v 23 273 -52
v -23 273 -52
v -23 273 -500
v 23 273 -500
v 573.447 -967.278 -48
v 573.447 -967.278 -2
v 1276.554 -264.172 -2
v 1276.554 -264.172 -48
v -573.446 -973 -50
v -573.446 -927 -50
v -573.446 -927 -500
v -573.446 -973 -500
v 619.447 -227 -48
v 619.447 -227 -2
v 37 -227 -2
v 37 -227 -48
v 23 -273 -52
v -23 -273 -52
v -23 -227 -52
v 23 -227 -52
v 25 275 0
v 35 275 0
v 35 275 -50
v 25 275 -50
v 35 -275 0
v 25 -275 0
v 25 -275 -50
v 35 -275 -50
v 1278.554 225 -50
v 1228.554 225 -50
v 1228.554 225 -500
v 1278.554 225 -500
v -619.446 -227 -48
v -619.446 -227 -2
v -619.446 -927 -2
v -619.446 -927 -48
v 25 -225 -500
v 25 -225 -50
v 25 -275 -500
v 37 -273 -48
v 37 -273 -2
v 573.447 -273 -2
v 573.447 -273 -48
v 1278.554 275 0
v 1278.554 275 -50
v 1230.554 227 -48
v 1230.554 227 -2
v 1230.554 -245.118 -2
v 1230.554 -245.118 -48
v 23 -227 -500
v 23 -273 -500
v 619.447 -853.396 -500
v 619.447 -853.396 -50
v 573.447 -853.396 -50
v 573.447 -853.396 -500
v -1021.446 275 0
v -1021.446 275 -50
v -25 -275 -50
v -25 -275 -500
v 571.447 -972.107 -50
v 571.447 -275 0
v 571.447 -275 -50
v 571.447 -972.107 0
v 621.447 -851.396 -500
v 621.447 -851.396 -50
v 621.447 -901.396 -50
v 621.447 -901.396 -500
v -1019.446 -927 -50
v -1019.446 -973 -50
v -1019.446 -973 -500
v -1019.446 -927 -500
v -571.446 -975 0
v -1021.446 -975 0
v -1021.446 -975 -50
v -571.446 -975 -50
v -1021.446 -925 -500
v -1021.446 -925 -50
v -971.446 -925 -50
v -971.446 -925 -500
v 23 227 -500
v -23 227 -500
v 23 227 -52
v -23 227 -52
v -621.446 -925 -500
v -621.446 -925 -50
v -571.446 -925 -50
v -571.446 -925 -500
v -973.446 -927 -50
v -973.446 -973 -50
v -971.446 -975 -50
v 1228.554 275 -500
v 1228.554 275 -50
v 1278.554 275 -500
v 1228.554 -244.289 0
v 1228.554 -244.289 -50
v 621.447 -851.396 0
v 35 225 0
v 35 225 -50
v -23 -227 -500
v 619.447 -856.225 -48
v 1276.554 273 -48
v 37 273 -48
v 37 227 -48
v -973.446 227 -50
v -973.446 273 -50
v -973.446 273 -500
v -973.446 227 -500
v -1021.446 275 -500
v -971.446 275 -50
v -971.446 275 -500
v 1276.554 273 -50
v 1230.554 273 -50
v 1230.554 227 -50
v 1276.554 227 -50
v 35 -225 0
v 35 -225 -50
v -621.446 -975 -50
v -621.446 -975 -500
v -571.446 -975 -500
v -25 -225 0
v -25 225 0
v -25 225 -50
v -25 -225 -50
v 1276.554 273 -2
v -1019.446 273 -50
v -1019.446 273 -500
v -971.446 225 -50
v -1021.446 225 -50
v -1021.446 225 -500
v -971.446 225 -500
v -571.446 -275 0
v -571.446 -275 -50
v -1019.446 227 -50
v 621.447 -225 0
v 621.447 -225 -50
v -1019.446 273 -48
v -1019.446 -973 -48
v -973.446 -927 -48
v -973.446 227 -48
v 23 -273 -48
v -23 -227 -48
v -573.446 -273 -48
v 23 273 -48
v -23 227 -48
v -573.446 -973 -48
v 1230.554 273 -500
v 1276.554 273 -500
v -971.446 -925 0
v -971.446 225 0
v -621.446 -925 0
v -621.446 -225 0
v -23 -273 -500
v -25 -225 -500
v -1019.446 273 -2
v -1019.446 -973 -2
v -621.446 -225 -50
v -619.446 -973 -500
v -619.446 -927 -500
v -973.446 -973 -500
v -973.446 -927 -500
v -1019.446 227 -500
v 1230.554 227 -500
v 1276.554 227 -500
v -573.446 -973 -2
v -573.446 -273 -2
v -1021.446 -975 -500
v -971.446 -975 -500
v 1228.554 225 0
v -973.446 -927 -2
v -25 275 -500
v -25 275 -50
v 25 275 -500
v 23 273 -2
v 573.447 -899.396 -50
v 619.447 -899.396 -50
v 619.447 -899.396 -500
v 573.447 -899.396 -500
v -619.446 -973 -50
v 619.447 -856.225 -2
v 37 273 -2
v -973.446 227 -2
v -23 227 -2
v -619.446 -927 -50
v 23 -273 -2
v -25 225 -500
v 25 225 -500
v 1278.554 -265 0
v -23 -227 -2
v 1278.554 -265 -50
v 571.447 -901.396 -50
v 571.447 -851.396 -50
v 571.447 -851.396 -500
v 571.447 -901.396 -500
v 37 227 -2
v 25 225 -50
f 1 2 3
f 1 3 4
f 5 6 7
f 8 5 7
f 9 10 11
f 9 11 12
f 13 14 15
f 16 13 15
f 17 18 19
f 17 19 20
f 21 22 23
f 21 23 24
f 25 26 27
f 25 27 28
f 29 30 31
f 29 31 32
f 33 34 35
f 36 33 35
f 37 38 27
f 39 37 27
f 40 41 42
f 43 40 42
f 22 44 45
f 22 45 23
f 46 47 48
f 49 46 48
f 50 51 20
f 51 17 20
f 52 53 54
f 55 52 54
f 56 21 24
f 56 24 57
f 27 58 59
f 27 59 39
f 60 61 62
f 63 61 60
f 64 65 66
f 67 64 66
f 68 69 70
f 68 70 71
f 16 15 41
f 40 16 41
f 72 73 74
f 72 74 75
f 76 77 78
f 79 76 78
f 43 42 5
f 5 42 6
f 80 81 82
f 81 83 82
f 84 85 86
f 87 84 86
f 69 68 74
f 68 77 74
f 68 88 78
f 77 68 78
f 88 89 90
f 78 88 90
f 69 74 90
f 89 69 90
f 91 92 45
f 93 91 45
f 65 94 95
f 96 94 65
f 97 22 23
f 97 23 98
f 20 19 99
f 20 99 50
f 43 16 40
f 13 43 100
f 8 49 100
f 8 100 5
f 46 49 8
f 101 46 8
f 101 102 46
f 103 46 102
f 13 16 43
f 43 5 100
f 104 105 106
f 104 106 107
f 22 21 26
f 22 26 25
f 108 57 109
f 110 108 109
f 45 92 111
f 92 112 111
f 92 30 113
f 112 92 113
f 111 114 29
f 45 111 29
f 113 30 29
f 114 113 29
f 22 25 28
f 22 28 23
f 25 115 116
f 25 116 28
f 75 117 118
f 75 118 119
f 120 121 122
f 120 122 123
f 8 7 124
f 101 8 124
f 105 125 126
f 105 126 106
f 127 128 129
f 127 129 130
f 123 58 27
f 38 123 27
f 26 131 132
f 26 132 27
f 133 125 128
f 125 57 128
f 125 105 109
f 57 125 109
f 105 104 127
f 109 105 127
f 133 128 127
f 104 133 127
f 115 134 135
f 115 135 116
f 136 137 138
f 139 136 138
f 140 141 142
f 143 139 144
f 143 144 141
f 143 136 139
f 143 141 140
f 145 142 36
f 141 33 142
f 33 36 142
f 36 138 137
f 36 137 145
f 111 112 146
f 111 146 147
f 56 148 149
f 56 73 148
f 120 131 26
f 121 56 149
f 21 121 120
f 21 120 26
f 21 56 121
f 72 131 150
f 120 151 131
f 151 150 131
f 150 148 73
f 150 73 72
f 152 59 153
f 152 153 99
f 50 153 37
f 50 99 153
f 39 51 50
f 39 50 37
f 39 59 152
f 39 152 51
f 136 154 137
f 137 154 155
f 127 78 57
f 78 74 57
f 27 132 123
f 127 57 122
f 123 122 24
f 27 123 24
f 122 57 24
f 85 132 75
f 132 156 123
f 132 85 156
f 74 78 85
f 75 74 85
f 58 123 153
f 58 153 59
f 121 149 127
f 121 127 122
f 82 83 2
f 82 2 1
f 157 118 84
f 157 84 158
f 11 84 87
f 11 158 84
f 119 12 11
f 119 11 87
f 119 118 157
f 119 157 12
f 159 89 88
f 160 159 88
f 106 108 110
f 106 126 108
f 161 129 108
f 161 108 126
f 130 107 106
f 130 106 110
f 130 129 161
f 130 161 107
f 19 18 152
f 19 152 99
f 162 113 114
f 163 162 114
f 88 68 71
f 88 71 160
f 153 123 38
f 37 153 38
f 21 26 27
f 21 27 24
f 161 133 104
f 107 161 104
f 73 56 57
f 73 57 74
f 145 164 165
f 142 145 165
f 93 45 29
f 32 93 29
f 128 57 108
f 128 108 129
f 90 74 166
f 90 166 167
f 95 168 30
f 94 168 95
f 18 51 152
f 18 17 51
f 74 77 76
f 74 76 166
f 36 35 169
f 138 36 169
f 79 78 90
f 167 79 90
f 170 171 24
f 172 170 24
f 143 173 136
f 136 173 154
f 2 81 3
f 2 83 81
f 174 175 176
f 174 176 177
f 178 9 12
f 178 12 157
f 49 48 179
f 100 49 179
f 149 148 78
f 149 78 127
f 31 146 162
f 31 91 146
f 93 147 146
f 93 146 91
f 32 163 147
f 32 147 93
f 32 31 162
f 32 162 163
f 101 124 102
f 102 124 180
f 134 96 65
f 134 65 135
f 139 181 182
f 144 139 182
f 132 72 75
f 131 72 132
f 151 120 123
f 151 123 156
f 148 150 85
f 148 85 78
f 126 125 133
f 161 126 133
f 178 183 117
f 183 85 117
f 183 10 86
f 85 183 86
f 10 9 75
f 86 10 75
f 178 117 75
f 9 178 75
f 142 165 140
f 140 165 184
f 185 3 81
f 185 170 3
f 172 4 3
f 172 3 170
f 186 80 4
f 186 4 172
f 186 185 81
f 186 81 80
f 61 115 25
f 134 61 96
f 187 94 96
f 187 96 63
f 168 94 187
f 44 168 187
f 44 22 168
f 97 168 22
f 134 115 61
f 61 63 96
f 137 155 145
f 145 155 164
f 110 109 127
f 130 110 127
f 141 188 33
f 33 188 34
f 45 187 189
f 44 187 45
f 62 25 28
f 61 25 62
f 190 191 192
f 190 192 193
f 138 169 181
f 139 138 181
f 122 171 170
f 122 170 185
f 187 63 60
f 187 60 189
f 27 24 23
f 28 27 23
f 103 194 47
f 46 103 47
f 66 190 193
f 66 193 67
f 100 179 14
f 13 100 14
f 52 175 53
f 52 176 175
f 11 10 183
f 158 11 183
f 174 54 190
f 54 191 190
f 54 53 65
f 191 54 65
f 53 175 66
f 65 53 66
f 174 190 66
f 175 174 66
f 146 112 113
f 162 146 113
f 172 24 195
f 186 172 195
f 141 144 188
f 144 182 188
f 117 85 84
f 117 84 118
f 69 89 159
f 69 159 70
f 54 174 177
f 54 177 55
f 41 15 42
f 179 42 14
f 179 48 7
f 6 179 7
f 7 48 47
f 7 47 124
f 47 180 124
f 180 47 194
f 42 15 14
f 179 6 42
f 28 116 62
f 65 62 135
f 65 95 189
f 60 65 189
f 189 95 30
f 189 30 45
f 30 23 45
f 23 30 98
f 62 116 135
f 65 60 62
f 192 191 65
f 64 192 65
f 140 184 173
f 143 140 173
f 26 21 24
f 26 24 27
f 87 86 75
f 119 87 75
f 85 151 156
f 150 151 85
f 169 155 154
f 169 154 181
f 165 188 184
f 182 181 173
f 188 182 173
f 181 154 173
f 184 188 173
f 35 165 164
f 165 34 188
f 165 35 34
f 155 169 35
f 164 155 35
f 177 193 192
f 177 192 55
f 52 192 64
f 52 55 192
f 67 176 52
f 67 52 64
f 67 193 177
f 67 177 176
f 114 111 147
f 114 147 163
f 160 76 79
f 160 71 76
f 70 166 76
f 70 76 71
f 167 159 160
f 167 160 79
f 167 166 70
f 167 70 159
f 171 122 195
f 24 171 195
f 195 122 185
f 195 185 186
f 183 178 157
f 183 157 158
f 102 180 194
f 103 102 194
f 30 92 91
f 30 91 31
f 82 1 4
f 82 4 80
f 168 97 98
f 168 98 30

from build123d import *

# Parameters (mm, degrees)
F1_DEPTH = 50
F2_DEPTH = 50
F3_DEPTH = 50
F4_T     = -2
F5_W     = 50
F5_H     = 50
F6_DEPTH = 450
F7_T     = -2


# Not quite as in the source:
# - a shell that OpenCascade refuses in one call is made with other operations: the cavity is built on its own and cut out


with BuildPart() as f1:
    # F0 (on Top) → F1 (new body)
    with BuildSketch(Plane.XY):
        Polygon((1278.5535, 275), (35, 275), (35, 225), (1228.5535, 225), align=None)
        Polygon((35, -225), (35, -275), (571.4467188135, -275), (621.4467188135, -225), align=None)
        Polygon((1278.5535, -265), (1278.5535, 275), (1228.5535, 225), (1228.5535, -244.2893218813), align=None)
        Polygon((621.4467188135, -851.3961030679), (571.4467188135, -901.3961030679), (571.4467188135, -972.1067811865), (1278.5535, -265), (1228.5535, -244.2893218813), align=None)
        Polygon((621.4467188135, -225), (571.4467188135, -275), (571.4467188135, -901.3961030679), (621.4467188135, -851.3961030679), align=None)
    extrude(amount=-F1_DEPTH)

    # F4#2 (hollow: no face is removed)
    offset(amount=F4_T, kind=Kind.INTERSECTION, mode=Mode.SUBTRACT)


with BuildPart() as f2:
    # F0 (on Top) → F2 (new body)
    with BuildSketch(Plane.XY):
        Polygon((-1021.4465, 275), (-1021.4465, -975), (-971.4465, -925), (-971.4465, 225), align=None)
        Polygon((-1021.4465, -975), (-571.4465, -975), (-621.4465, -925), (-971.4465, -925), align=None)
        Polygon((-621.4465, -925), (-571.4465, -975), (-571.4465, -275), (-621.4465, -225), align=None)
        Polygon((25, 275), (-1021.4465, 275), (-971.4465, 225), (-25, 225), align=None)
        Polygon((-621.4465, -225), (-571.4465, -275), (25, -275), (-25, -225), align=None)
        Polygon((-25, -225), (25, -275), (25, 275), (-25, 225), align=None)
    extrude(amount=-F2_DEPTH)

    # F4 (hollow: no face is removed)
    offset(amount=F4_T, kind=Kind.INTERSECTION, mode=Mode.SUBTRACT)


with BuildPart() as f3:
    # F0 (on Top) → F3 (new body)
    with BuildSketch(Plane.XY):
        Polygon((25, 275), (25, -275), (35, -275), (35, -225), (35, 225), (35, 275), align=None)
    extrude(amount=-F3_DEPTH)


with BuildPart() as f6:
    # F5 (on face) → F6 (new body)
    with BuildSketch(Plane(origin=(0, 0, -50), x_dir=(1, 0, 0), z_dir=(0, 0, -1))):
        with Locations((-996.4465, 950)):
            Rectangle(F5_W, F5_H)
        with Locations((-996.4465, -250)):
            Rectangle(F5_W, F5_H)
        with Locations((1253.5535, -250)):
            Rectangle(F5_W, F5_H)
        with Locations((596.4467188135, 876.3961030679)):
            Rectangle(F5_W, F5_H)
        with Locations((-596.4465, 950)):
            Rectangle(F5_W, F5_H)
        with Locations((0, 250)):
            Rectangle(F5_W, F5_H)
        with Locations((0, -250)):
            Rectangle(F5_W, F5_H)
    extrude(amount=F6_DEPTH)

    # F7: a shell. OpenCascade refuses it in one call, so the cavity is built on its own and cut out:
    # the body offset inwards by the wall thickness, plus a prism from it out through each open face.
    f7_core = offset(f6.part, amount=F7_T, mode=Mode.PRIVATE)
    f7_exits = [f7_core.faces().sort_by_distance(p)[0] for p in [
        (-996.4465, 250, -52),
        (-996.4465, -950, -52),
        (-996.4465, -950, -498),
        (-996.4465, 250, -498),
        (596.446719, -876.396103, -498),
        (1253.5535, 250, -498),
        (596.446719, -876.396103, -52),
        (1253.5535, 250, -52),
        (-596.4465, -950, -498),
        (-596.4465, -950, -52),
        (0, -250, -498),
        (0, 250, -498),
    ]]
    add(f7_core, mode=Mode.SUBTRACT)
    extrude(f7_exits, amount=-F7_T, mode=Mode.SUBTRACT)


solid = Compound([f1.part, f2.part, f3.part, f6.part])
